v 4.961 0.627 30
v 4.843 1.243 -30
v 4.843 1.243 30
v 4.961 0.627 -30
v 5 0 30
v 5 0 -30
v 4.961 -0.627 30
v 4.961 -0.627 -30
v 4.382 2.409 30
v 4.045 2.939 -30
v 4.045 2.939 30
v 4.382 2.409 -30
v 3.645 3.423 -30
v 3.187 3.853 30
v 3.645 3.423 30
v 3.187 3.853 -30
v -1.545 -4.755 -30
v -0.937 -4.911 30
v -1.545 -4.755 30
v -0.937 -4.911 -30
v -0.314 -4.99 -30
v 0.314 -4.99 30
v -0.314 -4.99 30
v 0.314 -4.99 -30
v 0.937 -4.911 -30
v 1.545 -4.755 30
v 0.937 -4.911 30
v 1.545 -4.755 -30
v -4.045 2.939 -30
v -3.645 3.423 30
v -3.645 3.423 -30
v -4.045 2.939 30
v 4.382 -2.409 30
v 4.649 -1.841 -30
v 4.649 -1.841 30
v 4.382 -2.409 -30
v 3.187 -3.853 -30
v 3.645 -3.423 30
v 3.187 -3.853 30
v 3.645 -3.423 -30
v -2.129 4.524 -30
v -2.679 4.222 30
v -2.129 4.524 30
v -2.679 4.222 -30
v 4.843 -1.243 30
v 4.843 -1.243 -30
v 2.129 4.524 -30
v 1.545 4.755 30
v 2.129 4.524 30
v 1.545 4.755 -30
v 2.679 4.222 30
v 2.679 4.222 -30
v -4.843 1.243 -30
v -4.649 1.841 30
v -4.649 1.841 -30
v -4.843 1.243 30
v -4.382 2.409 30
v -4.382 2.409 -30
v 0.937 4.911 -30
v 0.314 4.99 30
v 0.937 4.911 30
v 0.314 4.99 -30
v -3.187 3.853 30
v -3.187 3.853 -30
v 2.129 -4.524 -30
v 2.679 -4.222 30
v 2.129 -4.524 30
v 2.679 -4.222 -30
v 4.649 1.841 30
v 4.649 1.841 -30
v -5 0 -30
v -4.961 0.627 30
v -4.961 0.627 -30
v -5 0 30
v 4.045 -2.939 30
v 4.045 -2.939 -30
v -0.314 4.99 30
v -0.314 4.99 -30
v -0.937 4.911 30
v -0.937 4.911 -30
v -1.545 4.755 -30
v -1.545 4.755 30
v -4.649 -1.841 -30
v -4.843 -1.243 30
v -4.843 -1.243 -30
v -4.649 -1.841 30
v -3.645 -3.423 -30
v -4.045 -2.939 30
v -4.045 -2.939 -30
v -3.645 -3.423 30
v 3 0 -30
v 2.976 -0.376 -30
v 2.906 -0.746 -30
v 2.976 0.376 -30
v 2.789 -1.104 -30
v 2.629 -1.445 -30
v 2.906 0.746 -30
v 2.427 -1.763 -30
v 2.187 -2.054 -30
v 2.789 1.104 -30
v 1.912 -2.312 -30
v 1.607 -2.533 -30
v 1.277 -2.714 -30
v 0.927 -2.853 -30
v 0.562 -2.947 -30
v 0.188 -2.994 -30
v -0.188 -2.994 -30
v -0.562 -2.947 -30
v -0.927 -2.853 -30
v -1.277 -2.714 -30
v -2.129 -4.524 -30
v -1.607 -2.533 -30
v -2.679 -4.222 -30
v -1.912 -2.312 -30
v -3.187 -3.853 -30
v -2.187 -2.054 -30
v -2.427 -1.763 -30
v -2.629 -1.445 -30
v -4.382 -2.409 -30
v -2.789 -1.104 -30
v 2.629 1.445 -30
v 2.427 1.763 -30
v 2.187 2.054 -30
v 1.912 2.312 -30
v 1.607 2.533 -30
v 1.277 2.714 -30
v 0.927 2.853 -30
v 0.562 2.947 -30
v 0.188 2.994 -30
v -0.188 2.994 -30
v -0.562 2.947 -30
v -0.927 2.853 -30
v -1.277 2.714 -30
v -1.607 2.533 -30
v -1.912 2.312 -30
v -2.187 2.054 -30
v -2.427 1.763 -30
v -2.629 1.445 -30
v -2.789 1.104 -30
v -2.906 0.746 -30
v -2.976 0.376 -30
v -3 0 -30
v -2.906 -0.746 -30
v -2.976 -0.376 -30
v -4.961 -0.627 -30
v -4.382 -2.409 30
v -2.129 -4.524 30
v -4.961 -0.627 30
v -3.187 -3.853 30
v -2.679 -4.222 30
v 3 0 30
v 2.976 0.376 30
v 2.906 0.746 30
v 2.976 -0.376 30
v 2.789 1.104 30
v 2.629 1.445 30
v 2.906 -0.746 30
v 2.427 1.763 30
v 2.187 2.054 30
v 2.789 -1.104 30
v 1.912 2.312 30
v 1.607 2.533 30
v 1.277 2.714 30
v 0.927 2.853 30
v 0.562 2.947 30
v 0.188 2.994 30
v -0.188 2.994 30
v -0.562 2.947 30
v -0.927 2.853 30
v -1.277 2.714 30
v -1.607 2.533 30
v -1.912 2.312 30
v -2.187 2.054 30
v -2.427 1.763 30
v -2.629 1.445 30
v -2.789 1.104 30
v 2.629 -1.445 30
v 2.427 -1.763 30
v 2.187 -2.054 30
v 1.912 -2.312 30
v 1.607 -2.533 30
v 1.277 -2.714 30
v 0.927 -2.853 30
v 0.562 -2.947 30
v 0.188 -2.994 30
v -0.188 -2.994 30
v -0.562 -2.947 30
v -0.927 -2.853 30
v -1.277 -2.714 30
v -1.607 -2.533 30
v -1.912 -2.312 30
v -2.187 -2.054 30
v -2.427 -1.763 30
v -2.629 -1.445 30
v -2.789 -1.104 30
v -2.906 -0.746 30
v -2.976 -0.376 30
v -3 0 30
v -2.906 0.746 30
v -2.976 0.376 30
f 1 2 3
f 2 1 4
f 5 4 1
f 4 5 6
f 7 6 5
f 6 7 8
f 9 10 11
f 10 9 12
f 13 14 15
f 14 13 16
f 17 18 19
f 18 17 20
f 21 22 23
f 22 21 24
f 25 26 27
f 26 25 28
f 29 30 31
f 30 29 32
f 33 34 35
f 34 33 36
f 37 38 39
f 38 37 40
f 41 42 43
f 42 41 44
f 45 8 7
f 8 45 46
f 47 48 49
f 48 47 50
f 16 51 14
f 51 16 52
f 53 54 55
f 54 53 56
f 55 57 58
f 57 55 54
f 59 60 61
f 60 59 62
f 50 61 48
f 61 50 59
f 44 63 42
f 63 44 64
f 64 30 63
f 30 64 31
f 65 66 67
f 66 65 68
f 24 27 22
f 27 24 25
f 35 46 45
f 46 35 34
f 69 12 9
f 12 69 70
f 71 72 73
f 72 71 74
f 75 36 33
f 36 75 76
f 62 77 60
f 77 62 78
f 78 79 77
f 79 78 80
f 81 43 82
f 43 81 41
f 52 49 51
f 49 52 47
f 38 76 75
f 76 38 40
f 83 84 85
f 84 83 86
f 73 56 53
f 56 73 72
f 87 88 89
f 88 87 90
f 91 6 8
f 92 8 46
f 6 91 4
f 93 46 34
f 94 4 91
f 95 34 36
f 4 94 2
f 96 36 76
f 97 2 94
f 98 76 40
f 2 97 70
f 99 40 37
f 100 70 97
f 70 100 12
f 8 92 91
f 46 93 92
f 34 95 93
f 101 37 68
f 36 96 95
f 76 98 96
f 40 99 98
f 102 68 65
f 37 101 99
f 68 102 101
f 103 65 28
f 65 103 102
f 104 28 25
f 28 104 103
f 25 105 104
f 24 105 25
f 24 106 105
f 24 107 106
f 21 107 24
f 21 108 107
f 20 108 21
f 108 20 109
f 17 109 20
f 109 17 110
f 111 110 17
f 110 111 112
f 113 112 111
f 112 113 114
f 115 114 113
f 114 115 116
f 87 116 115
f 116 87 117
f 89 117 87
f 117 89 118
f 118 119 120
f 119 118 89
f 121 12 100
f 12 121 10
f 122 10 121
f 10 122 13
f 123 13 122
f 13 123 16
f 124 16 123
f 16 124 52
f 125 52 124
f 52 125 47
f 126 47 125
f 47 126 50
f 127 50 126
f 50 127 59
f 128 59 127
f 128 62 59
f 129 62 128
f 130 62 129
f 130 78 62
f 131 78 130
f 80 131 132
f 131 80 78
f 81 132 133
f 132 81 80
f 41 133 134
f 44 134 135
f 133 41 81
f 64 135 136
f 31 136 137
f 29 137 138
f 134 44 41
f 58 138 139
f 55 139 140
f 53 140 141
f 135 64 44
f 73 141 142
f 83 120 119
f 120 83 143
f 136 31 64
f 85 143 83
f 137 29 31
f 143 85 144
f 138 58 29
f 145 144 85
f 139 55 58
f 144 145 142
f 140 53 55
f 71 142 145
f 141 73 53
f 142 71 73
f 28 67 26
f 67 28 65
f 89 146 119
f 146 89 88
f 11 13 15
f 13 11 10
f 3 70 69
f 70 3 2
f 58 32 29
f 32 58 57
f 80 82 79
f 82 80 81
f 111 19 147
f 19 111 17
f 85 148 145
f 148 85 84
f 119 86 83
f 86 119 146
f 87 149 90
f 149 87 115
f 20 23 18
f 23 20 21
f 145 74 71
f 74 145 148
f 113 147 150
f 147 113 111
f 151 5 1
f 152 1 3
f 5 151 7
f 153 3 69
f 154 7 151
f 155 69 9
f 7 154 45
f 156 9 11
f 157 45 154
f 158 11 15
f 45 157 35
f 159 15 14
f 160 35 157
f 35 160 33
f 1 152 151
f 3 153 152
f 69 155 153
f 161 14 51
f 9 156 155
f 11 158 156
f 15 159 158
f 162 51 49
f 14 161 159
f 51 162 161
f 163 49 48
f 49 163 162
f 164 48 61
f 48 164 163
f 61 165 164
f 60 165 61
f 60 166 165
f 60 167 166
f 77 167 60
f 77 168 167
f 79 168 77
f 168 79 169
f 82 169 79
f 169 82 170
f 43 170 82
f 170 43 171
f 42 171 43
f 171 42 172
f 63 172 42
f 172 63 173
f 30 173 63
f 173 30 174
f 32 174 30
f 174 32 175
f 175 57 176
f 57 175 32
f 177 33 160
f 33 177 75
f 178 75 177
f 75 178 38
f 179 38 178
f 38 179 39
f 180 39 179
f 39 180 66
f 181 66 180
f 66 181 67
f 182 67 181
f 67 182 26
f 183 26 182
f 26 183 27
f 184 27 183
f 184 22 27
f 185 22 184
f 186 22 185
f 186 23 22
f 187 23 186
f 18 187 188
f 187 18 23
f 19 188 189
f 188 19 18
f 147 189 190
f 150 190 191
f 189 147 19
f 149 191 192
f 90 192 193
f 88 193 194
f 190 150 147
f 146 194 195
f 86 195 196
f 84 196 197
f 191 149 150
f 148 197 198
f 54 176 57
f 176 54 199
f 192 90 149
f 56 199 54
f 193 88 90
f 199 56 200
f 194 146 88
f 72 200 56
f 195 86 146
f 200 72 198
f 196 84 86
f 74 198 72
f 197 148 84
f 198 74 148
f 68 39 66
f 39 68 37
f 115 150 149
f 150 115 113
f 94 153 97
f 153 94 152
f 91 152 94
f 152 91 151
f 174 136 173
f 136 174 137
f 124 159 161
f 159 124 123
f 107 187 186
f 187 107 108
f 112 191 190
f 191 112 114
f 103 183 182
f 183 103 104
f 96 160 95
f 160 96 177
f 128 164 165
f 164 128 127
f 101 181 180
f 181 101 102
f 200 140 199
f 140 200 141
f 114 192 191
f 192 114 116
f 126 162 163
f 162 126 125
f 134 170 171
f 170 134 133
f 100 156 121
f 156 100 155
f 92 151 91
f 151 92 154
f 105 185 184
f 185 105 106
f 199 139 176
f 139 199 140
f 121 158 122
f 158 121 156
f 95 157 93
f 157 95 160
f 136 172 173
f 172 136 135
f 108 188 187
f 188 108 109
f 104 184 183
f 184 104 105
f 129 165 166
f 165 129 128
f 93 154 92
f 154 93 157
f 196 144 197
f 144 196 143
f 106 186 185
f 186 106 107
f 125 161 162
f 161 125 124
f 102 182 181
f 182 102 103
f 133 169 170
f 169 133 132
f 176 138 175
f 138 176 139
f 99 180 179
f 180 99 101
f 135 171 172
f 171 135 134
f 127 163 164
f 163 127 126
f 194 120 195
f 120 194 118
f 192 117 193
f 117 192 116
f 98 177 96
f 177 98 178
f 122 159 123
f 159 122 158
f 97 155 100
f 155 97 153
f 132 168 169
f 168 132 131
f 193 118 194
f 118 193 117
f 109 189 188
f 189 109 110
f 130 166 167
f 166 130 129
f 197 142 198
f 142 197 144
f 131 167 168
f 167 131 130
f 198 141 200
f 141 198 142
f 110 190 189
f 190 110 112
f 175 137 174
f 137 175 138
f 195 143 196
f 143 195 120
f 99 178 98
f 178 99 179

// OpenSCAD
$fn = 50;


difference() {
	union() {
		translate(v = [0, 0, -30.0000000000]) {
			cylinder(h = 60, r = 5.0000000000);
		}
	}
	union() {
		translate(v = [0, 0, -100.0000000000]) {
			cylinder(h = 200, r = 3.0000000000);
		}
	}
}
